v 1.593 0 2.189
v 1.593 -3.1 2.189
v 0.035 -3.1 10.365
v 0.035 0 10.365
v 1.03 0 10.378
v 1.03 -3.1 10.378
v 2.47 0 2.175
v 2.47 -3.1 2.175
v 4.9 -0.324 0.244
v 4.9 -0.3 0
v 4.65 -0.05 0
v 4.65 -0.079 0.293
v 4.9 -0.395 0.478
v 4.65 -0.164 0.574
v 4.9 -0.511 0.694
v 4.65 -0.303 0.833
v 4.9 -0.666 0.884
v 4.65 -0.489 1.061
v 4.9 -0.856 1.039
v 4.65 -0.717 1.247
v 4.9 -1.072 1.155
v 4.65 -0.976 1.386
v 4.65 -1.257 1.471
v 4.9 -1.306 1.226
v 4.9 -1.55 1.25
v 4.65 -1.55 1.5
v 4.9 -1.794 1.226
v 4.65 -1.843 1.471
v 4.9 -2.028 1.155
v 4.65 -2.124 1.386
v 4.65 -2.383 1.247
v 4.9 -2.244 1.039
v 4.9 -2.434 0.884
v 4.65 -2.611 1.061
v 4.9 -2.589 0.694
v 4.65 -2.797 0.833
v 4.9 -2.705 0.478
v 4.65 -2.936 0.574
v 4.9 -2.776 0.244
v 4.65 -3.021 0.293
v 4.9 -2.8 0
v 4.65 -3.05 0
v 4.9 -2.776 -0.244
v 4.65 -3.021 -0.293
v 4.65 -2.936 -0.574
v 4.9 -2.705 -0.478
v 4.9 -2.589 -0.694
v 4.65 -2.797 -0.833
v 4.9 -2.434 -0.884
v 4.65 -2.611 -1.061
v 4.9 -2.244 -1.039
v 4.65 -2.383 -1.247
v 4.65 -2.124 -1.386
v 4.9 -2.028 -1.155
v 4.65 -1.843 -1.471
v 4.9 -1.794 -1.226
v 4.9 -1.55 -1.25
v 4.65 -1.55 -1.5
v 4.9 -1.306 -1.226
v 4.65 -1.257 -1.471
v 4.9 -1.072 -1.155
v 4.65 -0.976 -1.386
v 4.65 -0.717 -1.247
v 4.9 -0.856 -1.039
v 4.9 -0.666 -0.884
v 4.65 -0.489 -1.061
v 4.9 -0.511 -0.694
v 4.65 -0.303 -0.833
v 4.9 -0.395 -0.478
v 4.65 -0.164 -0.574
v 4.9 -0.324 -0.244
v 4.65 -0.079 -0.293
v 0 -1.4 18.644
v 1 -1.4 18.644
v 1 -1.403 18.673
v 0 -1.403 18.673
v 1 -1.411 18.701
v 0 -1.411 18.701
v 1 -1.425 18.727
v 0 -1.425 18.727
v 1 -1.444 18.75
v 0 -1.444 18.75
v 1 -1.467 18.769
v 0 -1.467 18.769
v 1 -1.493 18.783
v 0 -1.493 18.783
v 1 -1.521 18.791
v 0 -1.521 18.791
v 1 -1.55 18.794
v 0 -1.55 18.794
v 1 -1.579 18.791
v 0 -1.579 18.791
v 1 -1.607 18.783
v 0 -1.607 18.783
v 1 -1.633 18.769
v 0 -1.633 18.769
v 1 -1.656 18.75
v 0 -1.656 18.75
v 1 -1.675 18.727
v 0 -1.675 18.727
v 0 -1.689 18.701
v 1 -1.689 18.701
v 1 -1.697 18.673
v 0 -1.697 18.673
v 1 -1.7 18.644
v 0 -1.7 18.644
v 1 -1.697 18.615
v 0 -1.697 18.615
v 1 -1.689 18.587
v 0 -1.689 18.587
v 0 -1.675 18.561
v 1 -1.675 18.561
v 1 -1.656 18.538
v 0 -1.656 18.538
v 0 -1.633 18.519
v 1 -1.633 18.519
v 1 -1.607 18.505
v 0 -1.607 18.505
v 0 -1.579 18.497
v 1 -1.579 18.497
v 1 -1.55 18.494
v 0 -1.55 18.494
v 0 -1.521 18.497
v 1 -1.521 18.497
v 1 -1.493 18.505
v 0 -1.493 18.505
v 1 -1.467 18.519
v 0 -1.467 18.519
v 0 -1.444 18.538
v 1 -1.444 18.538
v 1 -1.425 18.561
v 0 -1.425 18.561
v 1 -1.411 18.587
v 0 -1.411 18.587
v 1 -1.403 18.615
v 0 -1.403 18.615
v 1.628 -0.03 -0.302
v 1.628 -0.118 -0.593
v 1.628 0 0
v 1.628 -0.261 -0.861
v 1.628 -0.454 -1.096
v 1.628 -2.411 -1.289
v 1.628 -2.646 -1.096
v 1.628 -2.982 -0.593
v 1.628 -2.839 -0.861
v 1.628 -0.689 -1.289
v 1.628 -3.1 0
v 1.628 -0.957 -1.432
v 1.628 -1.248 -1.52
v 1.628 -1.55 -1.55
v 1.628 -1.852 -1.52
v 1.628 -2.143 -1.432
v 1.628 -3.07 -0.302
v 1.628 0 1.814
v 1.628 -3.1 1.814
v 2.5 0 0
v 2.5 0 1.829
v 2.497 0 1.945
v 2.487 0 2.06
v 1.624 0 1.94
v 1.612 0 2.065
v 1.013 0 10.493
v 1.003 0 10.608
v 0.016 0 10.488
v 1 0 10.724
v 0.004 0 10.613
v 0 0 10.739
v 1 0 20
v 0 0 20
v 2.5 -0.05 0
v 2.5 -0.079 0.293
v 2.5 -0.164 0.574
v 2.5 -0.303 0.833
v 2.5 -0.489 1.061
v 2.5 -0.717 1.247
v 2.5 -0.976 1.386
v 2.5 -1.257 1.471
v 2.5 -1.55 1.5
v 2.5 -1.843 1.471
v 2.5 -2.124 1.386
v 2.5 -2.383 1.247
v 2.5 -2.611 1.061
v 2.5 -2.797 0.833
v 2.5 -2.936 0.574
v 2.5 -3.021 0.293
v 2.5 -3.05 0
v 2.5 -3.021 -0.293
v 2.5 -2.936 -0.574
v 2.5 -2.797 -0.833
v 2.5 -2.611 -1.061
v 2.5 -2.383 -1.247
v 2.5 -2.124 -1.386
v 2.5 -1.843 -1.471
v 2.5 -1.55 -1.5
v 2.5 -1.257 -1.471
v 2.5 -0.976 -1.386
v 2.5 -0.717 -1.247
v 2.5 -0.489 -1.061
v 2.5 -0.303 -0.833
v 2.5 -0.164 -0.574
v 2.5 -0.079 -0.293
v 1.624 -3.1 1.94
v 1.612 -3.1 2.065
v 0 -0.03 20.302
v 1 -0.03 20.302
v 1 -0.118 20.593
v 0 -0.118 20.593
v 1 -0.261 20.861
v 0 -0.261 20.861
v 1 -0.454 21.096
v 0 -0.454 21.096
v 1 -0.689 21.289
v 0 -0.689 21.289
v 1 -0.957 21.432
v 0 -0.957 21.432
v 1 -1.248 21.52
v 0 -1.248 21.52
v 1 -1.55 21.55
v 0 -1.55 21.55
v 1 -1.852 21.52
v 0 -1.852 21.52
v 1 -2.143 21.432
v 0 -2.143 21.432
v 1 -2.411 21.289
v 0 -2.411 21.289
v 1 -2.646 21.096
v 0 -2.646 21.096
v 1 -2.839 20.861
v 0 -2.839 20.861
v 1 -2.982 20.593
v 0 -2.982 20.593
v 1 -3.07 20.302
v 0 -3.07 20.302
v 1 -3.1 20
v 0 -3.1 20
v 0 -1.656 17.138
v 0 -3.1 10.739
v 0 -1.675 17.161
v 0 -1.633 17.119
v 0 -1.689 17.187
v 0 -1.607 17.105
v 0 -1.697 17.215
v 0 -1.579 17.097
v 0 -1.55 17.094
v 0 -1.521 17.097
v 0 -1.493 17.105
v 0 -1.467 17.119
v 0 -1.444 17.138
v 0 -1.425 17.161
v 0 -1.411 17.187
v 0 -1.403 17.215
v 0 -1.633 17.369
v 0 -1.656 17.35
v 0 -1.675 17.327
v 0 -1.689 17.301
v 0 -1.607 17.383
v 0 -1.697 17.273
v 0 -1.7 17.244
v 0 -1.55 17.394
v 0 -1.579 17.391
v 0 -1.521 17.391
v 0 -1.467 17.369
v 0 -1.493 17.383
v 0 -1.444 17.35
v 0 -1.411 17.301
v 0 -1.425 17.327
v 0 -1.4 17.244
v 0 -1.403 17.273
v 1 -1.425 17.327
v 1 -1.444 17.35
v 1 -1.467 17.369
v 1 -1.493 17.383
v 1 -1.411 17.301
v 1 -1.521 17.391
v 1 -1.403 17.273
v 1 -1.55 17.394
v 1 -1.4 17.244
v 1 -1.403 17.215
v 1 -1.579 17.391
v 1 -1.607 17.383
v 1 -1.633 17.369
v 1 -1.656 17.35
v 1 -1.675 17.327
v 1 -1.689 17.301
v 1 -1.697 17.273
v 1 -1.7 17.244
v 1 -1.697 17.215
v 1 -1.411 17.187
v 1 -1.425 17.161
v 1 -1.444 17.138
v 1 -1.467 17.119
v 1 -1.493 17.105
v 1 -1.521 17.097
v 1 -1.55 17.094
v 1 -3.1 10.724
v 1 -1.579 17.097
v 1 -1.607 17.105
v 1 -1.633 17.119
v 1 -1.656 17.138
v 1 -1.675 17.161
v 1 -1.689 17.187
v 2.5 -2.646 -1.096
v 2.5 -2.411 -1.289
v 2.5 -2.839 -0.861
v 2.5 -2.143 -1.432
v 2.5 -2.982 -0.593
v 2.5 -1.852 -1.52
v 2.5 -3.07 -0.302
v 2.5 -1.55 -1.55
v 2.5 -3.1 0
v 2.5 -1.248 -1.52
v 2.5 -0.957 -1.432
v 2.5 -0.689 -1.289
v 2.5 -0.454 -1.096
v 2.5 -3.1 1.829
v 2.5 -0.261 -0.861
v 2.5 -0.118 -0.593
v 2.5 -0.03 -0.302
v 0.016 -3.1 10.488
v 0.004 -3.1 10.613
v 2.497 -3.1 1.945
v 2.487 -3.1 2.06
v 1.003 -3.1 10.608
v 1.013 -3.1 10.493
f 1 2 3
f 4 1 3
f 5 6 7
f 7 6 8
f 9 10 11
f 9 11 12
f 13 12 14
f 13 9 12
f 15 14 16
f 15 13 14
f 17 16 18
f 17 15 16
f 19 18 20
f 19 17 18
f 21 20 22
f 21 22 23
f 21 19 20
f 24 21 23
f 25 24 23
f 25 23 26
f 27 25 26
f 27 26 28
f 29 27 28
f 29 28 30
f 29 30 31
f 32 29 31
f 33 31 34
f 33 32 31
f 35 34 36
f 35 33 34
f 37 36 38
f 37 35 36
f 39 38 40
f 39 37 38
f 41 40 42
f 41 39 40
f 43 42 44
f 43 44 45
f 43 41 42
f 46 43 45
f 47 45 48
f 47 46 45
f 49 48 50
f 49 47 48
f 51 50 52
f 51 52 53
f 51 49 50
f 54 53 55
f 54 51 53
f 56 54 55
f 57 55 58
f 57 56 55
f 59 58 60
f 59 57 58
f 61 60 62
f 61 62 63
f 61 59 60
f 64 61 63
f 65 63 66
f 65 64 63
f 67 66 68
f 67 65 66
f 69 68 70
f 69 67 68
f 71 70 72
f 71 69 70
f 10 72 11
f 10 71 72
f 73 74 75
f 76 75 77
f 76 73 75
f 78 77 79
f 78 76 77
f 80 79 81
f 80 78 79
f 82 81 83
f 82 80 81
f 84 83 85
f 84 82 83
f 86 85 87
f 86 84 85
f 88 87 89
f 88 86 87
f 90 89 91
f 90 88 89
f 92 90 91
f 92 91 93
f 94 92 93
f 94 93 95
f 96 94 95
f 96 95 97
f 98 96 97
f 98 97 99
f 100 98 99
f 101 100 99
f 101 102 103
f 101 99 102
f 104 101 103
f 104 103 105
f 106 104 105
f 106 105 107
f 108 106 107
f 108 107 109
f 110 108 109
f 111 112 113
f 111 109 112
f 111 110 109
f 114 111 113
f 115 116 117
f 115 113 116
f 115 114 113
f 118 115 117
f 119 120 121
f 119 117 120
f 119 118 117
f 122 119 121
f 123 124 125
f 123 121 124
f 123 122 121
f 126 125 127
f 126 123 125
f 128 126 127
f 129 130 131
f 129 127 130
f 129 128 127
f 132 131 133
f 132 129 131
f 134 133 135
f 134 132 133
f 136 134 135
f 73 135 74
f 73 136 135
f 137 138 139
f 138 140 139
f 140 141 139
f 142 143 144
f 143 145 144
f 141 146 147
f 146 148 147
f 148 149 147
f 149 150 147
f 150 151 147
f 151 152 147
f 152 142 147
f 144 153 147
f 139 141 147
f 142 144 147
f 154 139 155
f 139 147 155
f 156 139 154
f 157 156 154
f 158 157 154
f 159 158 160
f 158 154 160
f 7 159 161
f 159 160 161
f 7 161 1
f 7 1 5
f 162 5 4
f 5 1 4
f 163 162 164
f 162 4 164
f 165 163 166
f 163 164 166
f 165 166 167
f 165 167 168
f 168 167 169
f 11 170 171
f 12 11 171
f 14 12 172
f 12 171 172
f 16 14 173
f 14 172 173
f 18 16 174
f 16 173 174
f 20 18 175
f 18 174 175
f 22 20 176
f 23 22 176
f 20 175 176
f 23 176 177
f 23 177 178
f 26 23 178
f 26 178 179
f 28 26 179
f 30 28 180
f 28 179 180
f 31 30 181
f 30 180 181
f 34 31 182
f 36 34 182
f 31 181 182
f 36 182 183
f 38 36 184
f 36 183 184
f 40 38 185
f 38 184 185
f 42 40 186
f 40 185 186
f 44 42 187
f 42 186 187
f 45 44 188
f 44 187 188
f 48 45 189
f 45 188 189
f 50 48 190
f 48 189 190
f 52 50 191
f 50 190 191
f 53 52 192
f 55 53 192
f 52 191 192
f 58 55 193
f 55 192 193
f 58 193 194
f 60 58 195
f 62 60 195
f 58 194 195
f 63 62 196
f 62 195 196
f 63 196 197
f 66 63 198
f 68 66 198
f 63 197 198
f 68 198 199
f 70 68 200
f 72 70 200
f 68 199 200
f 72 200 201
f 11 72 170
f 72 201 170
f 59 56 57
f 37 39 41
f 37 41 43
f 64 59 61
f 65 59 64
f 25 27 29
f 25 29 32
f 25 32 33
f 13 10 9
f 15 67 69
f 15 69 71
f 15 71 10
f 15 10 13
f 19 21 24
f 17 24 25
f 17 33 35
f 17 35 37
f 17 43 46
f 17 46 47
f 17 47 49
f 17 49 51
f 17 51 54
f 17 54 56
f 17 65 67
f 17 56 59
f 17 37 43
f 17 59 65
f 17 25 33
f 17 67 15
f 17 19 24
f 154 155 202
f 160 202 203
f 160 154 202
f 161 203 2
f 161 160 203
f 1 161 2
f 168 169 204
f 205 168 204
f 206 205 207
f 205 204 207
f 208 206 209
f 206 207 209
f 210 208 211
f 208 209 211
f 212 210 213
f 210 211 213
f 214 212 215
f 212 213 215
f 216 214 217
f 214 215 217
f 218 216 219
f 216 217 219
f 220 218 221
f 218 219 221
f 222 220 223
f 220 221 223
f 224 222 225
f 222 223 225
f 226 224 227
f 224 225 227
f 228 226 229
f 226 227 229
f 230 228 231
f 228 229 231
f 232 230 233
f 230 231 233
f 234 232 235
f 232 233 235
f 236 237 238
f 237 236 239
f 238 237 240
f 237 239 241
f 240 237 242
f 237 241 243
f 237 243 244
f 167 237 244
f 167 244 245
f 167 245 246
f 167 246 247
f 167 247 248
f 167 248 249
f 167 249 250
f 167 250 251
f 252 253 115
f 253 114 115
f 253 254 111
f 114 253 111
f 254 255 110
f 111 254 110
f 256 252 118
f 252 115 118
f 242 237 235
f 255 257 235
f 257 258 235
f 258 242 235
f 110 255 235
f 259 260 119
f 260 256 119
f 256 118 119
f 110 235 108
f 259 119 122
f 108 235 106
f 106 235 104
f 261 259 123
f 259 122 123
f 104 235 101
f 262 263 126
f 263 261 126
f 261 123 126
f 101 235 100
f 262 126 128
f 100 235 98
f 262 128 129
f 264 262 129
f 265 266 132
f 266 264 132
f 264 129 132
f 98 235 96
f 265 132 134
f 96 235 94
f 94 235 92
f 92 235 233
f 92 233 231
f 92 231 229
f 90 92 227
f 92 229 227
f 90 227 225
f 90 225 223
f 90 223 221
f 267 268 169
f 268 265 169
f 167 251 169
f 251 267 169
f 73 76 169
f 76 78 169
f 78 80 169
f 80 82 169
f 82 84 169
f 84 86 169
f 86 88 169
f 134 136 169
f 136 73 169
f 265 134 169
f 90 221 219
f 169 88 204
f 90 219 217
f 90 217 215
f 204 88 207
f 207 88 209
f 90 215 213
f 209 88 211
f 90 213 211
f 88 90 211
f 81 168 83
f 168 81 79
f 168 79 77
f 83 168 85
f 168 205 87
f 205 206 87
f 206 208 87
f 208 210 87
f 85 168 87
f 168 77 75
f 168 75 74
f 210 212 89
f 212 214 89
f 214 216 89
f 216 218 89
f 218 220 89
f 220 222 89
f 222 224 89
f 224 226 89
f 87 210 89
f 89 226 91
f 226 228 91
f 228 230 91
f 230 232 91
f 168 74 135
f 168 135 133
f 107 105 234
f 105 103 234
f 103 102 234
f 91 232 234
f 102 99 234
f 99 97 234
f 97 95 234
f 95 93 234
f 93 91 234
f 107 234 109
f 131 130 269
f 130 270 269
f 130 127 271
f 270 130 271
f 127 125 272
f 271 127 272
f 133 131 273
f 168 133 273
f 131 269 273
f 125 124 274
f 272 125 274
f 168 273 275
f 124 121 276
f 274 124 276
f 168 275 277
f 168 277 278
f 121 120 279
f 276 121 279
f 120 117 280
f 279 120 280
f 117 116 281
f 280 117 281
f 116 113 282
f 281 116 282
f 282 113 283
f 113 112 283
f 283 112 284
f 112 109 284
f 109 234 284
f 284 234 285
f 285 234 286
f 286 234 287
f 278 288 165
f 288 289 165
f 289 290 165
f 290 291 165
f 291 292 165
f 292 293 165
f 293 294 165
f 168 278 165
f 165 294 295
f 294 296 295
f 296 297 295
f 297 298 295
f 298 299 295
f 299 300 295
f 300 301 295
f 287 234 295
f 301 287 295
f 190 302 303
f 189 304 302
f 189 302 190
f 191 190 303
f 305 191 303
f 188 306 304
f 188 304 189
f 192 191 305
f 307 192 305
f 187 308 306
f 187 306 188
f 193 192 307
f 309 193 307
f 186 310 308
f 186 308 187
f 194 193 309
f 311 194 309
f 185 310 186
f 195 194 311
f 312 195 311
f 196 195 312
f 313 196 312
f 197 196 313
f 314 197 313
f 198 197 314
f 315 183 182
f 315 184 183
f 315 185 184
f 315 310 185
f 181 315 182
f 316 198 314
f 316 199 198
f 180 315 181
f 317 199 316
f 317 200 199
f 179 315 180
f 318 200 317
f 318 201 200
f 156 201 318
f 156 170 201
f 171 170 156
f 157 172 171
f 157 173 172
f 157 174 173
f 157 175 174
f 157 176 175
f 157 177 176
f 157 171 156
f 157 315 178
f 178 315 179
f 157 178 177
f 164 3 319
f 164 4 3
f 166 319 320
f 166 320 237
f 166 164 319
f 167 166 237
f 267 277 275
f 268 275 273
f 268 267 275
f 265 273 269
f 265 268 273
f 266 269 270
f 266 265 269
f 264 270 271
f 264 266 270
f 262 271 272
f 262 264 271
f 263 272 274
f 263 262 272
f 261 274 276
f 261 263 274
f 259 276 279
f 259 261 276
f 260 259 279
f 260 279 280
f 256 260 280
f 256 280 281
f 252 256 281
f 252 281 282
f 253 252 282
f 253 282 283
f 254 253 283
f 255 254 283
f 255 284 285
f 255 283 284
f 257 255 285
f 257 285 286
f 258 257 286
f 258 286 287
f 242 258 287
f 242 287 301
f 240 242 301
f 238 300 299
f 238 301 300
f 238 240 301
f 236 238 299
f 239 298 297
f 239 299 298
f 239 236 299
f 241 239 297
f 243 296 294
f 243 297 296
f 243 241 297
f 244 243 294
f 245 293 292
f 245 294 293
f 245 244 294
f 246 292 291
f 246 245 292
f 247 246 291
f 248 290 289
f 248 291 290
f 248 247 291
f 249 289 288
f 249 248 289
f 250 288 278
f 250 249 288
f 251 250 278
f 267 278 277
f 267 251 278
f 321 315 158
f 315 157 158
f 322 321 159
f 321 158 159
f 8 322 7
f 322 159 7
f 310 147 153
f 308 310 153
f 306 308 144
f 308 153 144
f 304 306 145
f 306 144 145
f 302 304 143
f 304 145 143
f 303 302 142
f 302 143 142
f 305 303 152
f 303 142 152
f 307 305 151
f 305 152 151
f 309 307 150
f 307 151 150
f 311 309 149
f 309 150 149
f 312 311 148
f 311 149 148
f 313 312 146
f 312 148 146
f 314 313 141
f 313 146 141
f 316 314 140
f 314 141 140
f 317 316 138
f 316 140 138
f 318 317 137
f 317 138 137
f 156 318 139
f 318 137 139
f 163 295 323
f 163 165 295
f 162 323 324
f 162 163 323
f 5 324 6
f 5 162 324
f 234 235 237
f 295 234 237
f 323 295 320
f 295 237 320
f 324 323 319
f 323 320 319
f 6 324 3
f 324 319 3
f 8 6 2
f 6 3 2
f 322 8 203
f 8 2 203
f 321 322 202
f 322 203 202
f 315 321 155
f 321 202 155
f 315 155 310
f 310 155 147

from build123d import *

# Parameters (mm, degrees)
F0_R     = 0.15
F1_DEPTH = 2.5
F2_R     = 1.5
F3_DEPTH = 2.4
F5_DEPTH = 25
F7_DEPTH = 25
F8_R     = 2
F9_SIZE  = 0.25


with BuildPart() as f1:
    # F0 (on Right) → F1 (new body)
    with BuildSketch(Plane.YZ):
        with BuildLine():
            ThreePointArc((-3.1, 0), (-1.55, -1.55), (0, 0))
            Line((0, 0), (0, 20))
            ThreePointArc((0, 20), (-1.55, 21.55), (-3.1, 20))
            Line((-3.1, 20), (-3.1, 0))
        make_face()
        with Locations((-1.55, 17.244)):
            Circle(F0_R, mode=Mode.SUBTRACT)
        with Locations((-1.55, 18.644)):
            Circle(F0_R, mode=Mode.SUBTRACT)
    extrude(amount=F1_DEPTH)

    # F2 (on face) → F3 (join)
    with BuildSketch(Plane.YZ.offset(2.5)):
        with Locations((-1.55, 0)):
            Circle(F2_R)
    extrude(amount=F3_DEPTH)

    # F4 (on face) → F5 (cut)
    with BuildSketch(Plane.XZ.offset(3.1)):
        Polygon((2.5, 10.55), (2.5, 21.55), (1, 21.55), (1, 10.55), (2.5, 2.0031642634), align=None)
    extrude(amount=-F5_DEPTH, mode=Mode.SUBTRACT)

    # F6 (on face) → F7 (cut)
    with BuildSketch(Plane.XZ.offset(3.1)):
        Polygon((1.6280860873, 2.0031642634), (0, 10.55), (0, -2.1245246753), (1.6280860873, -2.1245246753), align=None)
    extrude(amount=-F7_DEPTH, mode=Mode.SUBTRACT)

    # F8
    f8_edges = [f1.edges().sort_by_distance(p)[0] for p in [
        (1, -1.55, 10.55),
        (2.5, -1.55, 2.003164),
        (1.628086, -1.55, 2.003164),
        (0, -1.55, 10.55),
    ]]
    fillet(f8_edges, radius=F8_R)

    # F9
    f9_edges = [f1.edges().sort_by_distance(p)[0] for p in [
        (4.9, -3.05, 0),
    ]]
    chamfer(f9_edges, length=F9_SIZE)


solid = f1.part
